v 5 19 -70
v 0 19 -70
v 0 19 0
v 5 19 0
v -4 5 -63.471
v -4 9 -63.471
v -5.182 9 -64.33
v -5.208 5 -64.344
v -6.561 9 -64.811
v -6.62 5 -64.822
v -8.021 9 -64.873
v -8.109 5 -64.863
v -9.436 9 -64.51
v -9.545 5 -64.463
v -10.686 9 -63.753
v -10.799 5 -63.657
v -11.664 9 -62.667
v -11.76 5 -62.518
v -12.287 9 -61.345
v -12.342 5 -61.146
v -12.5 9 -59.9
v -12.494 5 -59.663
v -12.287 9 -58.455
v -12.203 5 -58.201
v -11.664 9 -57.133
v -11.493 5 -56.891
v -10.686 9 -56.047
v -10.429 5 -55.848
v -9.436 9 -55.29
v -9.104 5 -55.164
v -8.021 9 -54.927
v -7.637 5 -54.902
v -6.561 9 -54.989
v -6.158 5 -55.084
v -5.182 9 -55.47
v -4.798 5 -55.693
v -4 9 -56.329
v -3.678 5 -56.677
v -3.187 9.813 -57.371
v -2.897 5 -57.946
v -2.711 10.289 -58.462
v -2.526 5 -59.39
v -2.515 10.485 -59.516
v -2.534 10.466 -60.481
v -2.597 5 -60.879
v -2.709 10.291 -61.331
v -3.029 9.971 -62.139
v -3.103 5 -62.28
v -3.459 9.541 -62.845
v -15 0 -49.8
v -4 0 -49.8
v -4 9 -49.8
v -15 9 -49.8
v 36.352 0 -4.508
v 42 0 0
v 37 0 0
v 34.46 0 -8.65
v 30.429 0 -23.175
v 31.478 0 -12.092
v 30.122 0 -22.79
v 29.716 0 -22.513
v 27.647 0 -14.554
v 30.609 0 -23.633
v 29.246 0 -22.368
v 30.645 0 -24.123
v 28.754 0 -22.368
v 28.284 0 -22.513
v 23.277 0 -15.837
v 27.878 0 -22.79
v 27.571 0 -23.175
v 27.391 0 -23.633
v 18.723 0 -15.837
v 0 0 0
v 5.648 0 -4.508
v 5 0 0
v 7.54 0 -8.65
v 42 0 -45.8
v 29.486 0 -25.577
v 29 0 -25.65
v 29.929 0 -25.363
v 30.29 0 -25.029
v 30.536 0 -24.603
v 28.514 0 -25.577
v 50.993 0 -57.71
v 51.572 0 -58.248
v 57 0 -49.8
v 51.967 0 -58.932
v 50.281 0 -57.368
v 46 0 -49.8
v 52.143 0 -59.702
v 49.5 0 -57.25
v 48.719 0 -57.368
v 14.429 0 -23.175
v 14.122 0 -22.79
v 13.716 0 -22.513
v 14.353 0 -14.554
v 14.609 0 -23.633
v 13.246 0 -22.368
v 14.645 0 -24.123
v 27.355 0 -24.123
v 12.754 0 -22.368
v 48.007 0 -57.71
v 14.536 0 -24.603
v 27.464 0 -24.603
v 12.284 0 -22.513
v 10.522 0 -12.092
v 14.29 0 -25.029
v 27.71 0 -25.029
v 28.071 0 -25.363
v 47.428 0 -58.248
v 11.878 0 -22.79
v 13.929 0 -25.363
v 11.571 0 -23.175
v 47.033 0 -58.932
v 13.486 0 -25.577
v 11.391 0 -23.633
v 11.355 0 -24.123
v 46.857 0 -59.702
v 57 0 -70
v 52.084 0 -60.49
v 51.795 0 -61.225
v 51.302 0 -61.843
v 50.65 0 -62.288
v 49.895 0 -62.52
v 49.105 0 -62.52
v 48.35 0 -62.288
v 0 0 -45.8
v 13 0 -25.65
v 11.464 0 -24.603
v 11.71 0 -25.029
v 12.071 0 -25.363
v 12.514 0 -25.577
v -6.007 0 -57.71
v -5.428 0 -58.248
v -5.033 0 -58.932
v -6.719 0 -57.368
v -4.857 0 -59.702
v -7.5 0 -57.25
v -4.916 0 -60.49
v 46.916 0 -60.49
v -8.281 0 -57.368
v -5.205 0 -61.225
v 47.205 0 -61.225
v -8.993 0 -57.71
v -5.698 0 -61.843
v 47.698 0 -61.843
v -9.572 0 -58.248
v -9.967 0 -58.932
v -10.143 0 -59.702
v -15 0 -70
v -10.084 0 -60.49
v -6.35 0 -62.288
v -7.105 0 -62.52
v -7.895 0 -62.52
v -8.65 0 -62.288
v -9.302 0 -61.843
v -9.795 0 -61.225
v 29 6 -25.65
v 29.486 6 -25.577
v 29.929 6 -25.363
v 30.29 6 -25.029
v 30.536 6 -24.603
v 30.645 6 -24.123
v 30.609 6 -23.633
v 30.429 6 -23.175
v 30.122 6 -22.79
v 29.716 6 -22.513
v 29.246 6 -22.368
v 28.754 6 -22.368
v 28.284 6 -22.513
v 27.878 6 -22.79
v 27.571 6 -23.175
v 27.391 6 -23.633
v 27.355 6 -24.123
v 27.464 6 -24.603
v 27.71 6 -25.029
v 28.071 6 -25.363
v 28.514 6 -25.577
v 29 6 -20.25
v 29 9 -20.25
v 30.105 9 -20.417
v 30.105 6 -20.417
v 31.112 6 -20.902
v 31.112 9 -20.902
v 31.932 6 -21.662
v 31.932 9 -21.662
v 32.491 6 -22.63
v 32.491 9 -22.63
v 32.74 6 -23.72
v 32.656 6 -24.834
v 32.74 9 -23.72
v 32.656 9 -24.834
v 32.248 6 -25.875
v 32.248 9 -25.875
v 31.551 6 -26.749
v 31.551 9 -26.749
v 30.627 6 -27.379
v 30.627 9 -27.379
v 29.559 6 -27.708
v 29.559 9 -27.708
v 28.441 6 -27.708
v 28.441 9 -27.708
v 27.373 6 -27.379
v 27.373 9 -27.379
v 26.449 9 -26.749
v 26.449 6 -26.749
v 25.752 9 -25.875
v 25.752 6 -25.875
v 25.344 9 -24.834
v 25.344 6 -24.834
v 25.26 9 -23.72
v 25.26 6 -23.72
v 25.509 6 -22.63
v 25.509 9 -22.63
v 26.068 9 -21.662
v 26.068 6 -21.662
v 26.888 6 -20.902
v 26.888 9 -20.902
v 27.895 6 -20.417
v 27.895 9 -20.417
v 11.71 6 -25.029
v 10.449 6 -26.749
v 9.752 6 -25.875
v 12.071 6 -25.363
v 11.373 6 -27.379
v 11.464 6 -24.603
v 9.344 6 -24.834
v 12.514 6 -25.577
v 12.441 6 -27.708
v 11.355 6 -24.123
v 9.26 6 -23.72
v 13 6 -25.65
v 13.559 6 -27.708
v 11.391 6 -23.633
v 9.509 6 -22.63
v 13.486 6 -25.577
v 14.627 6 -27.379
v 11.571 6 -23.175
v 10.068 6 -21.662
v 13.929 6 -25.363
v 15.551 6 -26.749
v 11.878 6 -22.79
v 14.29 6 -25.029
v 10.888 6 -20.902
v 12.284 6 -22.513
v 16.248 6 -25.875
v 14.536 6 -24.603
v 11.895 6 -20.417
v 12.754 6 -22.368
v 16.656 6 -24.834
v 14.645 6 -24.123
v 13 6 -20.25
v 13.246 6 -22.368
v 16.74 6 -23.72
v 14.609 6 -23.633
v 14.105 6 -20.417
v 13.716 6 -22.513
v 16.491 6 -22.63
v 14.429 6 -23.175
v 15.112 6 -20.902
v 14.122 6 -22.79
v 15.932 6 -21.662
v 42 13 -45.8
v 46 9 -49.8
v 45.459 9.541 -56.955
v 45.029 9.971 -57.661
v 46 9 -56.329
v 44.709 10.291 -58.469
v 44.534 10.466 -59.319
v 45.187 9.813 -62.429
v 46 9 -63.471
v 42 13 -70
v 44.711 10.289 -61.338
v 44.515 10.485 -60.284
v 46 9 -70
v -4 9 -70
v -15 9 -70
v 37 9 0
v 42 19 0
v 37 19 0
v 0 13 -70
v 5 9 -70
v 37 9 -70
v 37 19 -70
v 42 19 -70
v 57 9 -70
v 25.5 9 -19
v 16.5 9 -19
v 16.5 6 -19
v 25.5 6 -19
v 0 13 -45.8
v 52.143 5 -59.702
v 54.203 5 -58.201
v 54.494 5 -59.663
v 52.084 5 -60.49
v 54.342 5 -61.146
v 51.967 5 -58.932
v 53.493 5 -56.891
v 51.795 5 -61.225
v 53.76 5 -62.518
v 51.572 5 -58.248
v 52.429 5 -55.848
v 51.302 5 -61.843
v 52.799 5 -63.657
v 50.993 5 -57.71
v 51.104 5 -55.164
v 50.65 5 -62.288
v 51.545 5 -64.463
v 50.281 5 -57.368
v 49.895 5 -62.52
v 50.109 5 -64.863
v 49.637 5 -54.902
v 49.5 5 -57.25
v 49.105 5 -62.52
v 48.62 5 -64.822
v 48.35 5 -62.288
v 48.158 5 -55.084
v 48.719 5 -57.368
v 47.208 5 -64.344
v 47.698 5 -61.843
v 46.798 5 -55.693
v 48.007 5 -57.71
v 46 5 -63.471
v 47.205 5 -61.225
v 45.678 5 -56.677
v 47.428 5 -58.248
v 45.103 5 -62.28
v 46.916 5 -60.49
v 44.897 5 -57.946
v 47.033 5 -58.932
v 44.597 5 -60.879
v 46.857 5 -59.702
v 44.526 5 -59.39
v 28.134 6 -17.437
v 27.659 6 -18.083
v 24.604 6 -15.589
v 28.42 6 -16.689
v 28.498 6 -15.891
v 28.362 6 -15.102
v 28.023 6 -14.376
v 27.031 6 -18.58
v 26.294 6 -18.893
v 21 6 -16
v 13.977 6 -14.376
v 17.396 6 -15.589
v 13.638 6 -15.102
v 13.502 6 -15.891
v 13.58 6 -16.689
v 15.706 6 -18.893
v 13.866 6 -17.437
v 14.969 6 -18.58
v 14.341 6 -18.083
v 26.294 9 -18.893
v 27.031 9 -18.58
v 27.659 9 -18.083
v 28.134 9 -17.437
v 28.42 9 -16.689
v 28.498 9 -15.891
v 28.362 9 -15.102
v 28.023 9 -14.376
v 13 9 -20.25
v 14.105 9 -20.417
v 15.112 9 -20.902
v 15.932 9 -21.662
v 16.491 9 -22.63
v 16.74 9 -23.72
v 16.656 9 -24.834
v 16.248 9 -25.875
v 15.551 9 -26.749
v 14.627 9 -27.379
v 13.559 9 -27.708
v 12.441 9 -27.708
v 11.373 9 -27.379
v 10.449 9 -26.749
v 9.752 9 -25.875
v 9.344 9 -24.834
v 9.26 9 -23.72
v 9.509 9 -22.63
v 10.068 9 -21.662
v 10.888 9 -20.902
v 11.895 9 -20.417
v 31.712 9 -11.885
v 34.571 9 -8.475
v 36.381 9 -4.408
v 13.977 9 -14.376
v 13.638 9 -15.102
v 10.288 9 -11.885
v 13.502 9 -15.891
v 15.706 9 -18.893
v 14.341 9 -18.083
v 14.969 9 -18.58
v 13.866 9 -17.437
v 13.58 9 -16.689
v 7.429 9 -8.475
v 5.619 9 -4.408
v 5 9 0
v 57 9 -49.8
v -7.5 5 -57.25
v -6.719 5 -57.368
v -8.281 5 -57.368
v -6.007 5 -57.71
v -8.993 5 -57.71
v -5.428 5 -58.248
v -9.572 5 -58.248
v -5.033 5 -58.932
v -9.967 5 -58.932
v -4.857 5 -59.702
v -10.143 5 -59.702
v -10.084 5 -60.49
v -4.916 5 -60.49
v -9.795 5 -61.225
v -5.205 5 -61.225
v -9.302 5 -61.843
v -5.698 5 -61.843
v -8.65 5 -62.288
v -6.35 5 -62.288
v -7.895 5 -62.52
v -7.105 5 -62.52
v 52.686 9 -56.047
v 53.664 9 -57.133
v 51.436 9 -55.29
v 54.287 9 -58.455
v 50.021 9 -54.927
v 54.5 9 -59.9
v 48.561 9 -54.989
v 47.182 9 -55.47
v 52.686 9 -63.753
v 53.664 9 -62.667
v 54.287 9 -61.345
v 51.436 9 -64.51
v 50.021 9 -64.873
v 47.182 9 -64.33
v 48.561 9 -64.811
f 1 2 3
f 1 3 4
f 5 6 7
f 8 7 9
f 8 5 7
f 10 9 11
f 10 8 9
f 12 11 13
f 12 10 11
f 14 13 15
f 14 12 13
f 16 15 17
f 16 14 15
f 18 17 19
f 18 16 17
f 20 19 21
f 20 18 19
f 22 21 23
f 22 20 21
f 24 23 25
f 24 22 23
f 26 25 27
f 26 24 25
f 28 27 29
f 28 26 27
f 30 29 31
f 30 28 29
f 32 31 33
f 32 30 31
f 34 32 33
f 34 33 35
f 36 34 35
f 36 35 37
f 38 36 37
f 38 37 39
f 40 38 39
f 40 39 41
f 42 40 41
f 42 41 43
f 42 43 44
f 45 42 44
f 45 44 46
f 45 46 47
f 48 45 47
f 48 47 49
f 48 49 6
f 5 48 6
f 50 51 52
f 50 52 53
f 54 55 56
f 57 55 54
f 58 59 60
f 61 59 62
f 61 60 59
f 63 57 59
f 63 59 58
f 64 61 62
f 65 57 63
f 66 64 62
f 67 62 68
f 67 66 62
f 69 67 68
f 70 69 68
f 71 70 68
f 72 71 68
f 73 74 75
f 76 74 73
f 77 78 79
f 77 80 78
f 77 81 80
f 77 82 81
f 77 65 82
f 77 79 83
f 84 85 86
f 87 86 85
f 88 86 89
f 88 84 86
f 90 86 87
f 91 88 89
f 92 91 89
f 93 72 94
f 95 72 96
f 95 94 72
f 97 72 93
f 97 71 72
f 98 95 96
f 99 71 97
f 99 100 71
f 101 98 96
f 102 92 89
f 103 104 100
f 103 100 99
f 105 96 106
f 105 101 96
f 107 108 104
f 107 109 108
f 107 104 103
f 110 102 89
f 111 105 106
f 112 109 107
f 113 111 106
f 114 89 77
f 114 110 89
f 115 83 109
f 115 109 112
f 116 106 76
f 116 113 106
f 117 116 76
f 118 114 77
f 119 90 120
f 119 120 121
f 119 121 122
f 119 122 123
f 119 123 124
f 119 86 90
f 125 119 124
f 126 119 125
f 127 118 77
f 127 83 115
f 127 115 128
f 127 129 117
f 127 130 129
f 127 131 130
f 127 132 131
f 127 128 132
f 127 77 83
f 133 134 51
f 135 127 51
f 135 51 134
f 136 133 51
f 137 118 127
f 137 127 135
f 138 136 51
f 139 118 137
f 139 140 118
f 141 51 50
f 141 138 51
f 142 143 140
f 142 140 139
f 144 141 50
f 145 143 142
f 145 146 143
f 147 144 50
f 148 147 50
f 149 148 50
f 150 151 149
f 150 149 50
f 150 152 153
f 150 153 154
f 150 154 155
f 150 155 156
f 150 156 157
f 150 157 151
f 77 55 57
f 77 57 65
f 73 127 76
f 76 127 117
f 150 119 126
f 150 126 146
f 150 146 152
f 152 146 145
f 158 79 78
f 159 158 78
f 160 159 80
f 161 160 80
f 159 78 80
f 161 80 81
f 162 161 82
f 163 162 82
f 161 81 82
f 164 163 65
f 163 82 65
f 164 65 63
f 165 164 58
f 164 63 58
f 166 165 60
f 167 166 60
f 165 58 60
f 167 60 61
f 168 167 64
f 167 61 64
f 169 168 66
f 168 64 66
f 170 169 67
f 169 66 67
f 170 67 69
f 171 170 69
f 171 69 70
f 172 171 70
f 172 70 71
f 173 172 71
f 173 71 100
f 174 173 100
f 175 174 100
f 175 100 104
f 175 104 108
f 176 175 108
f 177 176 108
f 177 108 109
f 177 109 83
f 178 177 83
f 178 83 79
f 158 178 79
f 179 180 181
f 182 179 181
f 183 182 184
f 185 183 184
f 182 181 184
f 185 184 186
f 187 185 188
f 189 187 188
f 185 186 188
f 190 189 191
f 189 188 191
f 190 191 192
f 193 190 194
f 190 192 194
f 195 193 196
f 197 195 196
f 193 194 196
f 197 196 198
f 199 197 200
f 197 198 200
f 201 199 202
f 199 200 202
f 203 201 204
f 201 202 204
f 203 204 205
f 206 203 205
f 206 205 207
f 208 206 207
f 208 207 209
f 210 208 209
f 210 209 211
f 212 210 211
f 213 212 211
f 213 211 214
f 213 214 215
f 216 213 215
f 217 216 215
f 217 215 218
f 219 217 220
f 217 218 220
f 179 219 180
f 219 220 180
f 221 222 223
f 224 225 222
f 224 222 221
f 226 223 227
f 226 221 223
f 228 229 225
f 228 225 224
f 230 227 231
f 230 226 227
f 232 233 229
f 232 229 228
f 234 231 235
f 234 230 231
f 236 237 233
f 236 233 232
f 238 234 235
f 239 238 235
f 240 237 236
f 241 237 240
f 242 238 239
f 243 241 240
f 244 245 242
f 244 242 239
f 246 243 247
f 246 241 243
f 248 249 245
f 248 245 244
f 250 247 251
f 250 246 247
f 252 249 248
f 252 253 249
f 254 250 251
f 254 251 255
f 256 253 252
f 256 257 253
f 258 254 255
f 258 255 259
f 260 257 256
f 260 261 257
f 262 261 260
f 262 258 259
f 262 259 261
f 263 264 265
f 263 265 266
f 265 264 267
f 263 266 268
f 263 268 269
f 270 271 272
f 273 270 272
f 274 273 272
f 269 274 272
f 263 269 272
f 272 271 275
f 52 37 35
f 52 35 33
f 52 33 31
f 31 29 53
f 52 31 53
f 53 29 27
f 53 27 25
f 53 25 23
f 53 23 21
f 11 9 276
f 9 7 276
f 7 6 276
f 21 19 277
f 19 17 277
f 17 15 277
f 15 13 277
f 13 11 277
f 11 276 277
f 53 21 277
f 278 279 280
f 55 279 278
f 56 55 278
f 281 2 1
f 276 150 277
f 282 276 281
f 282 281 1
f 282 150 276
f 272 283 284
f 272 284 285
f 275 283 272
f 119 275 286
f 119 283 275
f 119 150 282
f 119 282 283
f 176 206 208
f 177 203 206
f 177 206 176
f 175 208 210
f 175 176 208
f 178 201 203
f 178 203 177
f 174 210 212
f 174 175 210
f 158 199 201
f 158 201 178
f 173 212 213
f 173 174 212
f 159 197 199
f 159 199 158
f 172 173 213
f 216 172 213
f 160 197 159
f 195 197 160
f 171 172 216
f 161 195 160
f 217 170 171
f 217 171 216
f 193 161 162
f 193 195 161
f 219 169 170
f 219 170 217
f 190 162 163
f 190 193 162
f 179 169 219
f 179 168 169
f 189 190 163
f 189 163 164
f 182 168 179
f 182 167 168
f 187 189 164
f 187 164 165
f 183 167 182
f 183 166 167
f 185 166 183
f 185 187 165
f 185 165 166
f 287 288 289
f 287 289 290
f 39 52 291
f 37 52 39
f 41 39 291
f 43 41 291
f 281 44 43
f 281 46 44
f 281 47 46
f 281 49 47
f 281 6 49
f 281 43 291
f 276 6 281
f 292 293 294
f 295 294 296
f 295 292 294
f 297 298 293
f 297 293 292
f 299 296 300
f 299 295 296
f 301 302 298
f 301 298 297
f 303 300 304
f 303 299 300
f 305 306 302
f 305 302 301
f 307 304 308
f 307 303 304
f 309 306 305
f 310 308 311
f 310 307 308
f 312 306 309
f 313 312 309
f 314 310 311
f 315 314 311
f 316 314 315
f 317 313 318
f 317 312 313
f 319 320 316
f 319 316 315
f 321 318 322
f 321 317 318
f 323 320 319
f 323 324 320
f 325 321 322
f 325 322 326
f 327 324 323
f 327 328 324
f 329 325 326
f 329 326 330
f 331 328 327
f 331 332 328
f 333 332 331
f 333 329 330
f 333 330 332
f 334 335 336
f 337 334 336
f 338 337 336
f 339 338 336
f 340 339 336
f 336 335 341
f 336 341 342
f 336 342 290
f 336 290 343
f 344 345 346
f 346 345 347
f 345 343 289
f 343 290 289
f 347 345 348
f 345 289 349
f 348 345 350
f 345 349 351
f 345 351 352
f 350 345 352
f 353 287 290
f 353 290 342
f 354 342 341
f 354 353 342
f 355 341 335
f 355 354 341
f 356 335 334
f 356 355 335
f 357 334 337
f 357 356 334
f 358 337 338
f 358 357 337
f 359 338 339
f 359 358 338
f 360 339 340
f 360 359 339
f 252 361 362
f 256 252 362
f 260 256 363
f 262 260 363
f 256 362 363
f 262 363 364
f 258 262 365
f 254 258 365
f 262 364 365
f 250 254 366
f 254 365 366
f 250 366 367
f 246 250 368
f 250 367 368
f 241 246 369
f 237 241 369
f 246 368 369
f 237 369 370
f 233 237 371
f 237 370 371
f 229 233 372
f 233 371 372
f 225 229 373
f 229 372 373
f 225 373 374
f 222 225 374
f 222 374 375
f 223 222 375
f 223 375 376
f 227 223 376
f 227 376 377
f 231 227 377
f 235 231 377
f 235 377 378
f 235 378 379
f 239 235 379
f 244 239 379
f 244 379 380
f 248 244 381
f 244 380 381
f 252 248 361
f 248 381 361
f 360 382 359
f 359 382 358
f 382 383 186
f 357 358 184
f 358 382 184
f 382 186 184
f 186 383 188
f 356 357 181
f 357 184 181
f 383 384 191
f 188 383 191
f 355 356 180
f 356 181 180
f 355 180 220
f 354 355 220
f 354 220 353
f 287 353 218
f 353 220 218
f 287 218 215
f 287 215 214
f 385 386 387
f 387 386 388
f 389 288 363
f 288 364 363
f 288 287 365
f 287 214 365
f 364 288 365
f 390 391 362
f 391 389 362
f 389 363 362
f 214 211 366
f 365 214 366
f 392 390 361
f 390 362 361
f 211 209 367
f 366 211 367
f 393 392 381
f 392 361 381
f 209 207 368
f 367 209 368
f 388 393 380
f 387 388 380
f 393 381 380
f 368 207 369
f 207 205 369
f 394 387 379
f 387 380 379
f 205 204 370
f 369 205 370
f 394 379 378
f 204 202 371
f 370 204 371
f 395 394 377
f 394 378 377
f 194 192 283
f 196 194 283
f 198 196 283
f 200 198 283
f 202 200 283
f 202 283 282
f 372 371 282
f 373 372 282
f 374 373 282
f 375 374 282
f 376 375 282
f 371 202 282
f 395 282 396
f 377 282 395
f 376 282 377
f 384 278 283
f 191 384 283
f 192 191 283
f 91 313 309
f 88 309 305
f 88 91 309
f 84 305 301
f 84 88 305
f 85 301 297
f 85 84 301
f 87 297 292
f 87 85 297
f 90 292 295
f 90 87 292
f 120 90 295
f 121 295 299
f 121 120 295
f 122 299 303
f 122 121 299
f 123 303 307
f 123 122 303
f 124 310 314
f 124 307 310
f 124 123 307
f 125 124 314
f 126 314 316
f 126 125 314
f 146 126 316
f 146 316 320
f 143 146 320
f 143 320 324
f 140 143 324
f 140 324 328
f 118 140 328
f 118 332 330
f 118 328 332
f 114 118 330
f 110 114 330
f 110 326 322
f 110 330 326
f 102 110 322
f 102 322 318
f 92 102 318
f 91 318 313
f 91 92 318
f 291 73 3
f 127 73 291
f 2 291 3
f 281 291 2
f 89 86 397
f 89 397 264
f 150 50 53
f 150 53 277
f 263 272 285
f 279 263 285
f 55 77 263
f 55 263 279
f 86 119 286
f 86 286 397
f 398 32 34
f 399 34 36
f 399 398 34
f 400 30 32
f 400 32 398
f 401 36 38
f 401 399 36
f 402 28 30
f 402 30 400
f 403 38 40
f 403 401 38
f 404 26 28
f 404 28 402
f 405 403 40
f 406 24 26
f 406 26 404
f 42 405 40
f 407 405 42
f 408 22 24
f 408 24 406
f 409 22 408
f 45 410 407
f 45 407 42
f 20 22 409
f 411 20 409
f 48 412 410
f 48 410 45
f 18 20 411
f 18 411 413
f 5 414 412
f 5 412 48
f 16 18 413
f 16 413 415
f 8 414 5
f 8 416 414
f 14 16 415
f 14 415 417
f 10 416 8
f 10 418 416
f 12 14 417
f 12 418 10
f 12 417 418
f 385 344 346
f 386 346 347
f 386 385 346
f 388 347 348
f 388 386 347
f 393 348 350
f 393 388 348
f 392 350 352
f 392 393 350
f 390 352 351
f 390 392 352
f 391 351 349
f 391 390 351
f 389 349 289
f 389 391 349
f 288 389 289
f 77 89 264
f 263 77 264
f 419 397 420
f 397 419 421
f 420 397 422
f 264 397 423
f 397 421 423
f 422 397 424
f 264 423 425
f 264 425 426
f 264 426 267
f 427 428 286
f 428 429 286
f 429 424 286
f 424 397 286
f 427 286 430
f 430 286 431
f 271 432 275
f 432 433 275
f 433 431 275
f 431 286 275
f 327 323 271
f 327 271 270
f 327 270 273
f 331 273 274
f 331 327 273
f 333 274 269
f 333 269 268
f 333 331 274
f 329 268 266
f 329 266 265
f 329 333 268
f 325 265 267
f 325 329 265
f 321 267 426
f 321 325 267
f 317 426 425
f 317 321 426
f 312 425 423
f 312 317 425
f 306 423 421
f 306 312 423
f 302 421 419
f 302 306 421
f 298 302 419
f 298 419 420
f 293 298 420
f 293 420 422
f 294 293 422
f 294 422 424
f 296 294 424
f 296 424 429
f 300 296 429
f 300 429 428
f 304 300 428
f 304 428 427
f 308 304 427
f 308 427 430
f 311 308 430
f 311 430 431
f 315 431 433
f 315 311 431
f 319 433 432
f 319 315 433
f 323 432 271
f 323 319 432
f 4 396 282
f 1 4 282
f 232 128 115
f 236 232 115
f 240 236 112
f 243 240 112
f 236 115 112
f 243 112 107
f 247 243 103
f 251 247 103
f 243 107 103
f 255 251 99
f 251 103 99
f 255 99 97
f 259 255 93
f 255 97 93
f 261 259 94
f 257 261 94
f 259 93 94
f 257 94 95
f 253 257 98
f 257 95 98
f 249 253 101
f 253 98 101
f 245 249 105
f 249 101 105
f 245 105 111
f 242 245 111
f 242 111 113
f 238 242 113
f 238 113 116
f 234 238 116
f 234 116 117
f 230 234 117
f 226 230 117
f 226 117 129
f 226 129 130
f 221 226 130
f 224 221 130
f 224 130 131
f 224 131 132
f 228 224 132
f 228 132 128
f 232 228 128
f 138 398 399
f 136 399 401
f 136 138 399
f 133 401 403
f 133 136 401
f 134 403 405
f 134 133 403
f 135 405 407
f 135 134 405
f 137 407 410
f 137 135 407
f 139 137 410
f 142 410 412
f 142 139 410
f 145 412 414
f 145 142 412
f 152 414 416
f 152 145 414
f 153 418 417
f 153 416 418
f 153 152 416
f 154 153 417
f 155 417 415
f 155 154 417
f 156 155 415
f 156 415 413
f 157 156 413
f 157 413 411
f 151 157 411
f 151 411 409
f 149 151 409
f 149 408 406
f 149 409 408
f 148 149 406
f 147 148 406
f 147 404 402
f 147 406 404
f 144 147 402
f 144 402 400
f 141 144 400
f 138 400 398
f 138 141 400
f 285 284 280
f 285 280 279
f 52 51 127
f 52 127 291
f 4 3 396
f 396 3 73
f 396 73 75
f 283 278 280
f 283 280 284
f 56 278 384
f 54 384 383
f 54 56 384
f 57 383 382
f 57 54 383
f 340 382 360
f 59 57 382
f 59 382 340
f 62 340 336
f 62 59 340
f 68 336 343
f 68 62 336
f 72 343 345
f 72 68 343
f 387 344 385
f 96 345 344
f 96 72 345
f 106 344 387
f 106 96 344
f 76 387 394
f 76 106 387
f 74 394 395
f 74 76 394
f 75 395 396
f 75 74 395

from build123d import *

# Parameters (mm, degrees)
SKETCH1_R               = 2.65
BOSS_EXTRUDE1_DEPTH     = 9
SKETCH2_W               = 5
SKETCH2_H               = 70
BOSS_EXTRUDE2_DEPTH     = 10
SKETCH3_R               = 1.65
CUT_EXTRUDE1_DEPTH      = 10
SKETCH4_R               = 3.75
CUT_EXTRUDE2_DEPTH      = 3
CUT_EXTRUDE3_DEPTH      = 3
CHAMFER1_SIZE           = 4
CUT_EXTRUDE4_DEPTH      = 5
CUT_EXTRUDE4_DEPTH_BACK = 4
SKETCH6_R               = 5


with BuildPart() as part:
    # Sketch1 → Boss-Extrude1 (new body)
    with BuildSketch(Plane(origin=(0, 0, 0), x_dir=(1, 0, 0), z_dir=(0, 1, 0))):
        with BuildLine():
            Line((57, 70), (57, 49.8))
            Line((57, 49.8), (42, 49.8))
            Line((42, 49.8), (42, 0))
            Line((42, 0), (37, 0))
            ThreePointArc((37, 0), (21, 16), (5, 0))
            Line((5, 0), (0, 0))
            Line((0, 0), (0, 49.8))
            Line((0, 49.8), (-15, 49.8))
            Line((-15, 49.8), (-15, 70))
            Line((-15, 70), (0, 70))
            Line((0, 70), (57, 70))
        make_face()
        with Locations(Location((-7.5, 59.9, 0), (0, 0, 270))):
            Circle(SKETCH1_R, mode=Mode.SUBTRACT)
        with Locations(Location((49.5, 59.9, 0), (0, 0, 270))):
            Circle(SKETCH1_R, mode=Mode.SUBTRACT)
    extrude(amount=BOSS_EXTRUDE1_DEPTH)

    # Sketch2 → Boss-Extrude2 (add)
    with BuildSketch(Plane(origin=(0, 9, 0), x_dir=(1, 0, 0), z_dir=(0, 1, 0))):
        with Locations((2.5, 35)):
            Rectangle(SKETCH2_W, SKETCH2_H)
        with Locations((39.5, 35)):
            Rectangle(SKETCH2_W, SKETCH2_H)
    extrude(amount=BOSS_EXTRUDE2_DEPTH)

    # Sketch3 → Cut-Extrude1 (cut)
    with BuildSketch(Plane.XZ):
        with Locations(Location((13, -24, 0), (0, 0, 270))):
            Circle(SKETCH3_R)
        with Locations(Location((29, -24, 0), (0, 0, 270))):
            Circle(SKETCH3_R)
    extrude(amount=-CUT_EXTRUDE1_DEPTH, mode=Mode.SUBTRACT)

    # Sketch4 → Cut-Extrude2 (cut)
    with BuildSketch(Plane(origin=(0, 9, 0), x_dir=(1, 0, 0), z_dir=(0, 1, 0))):
        with Locations(Location((13, 24, 0), (0, 0, 270))):
            Circle(SKETCH4_R)
        with Locations(Location((29, 24, 0), (0, 0, 270))):
            Circle(SKETCH4_R)
    extrude(amount=-CUT_EXTRUDE2_DEPTH, mode=Mode.SUBTRACT)

    # Sketch5 → Cut-Extrude3 (cut)
    with BuildSketch(Plane(origin=(0, 9, 0), x_dir=(1, 0, 0), z_dir=(0, 1, 0))):
        with BuildLine():
            Line((16.5, 19), (25.5, 19))
            ThreePointArc((25.5, 19), (28.5, 16), (25.5, 13))
            Line((25.5, 13), (16.5, 13))
            ThreePointArc((16.5, 13), (13.5, 16), (16.5, 19))
        make_face()
    extrude(amount=-CUT_EXTRUDE3_DEPTH, mode=Mode.SUBTRACT)

    # Chamfer1
    chamfer1_edges = [part.edges().sort_by_distance(p)[0] for p in [
        (42, 4.5, -49.8),
        (0, 4.5, -49.8),
        (0, 9, -59.9),
        (42, 9, -59.9),
    ]]
    chamfer(chamfer1_edges, length=CHAMFER1_SIZE)

    # Sketch6 → Cut-Extrude4 (cut, two sides: drawn at the far end of the back side and taken through both)
    with BuildSketch(Plane(origin=(0, 9, 0), x_dir=(1, 0, 0), z_dir=(0, 1, 0)).offset(-CUT_EXTRUDE4_DEPTH_BACK)):
        with Locations(Location((-7.5, 59.9, 0), (0, 0, 45.572995999))):
            Circle(SKETCH6_R)
        with Locations(Location((49.5, 59.9, 0), (0, 0, 134.427004001))):
            Circle(SKETCH6_R)
    extrude(amount=CUT_EXTRUDE4_DEPTH + CUT_EXTRUDE4_DEPTH_BACK, mode=Mode.SUBTRACT)


solid = part.part
